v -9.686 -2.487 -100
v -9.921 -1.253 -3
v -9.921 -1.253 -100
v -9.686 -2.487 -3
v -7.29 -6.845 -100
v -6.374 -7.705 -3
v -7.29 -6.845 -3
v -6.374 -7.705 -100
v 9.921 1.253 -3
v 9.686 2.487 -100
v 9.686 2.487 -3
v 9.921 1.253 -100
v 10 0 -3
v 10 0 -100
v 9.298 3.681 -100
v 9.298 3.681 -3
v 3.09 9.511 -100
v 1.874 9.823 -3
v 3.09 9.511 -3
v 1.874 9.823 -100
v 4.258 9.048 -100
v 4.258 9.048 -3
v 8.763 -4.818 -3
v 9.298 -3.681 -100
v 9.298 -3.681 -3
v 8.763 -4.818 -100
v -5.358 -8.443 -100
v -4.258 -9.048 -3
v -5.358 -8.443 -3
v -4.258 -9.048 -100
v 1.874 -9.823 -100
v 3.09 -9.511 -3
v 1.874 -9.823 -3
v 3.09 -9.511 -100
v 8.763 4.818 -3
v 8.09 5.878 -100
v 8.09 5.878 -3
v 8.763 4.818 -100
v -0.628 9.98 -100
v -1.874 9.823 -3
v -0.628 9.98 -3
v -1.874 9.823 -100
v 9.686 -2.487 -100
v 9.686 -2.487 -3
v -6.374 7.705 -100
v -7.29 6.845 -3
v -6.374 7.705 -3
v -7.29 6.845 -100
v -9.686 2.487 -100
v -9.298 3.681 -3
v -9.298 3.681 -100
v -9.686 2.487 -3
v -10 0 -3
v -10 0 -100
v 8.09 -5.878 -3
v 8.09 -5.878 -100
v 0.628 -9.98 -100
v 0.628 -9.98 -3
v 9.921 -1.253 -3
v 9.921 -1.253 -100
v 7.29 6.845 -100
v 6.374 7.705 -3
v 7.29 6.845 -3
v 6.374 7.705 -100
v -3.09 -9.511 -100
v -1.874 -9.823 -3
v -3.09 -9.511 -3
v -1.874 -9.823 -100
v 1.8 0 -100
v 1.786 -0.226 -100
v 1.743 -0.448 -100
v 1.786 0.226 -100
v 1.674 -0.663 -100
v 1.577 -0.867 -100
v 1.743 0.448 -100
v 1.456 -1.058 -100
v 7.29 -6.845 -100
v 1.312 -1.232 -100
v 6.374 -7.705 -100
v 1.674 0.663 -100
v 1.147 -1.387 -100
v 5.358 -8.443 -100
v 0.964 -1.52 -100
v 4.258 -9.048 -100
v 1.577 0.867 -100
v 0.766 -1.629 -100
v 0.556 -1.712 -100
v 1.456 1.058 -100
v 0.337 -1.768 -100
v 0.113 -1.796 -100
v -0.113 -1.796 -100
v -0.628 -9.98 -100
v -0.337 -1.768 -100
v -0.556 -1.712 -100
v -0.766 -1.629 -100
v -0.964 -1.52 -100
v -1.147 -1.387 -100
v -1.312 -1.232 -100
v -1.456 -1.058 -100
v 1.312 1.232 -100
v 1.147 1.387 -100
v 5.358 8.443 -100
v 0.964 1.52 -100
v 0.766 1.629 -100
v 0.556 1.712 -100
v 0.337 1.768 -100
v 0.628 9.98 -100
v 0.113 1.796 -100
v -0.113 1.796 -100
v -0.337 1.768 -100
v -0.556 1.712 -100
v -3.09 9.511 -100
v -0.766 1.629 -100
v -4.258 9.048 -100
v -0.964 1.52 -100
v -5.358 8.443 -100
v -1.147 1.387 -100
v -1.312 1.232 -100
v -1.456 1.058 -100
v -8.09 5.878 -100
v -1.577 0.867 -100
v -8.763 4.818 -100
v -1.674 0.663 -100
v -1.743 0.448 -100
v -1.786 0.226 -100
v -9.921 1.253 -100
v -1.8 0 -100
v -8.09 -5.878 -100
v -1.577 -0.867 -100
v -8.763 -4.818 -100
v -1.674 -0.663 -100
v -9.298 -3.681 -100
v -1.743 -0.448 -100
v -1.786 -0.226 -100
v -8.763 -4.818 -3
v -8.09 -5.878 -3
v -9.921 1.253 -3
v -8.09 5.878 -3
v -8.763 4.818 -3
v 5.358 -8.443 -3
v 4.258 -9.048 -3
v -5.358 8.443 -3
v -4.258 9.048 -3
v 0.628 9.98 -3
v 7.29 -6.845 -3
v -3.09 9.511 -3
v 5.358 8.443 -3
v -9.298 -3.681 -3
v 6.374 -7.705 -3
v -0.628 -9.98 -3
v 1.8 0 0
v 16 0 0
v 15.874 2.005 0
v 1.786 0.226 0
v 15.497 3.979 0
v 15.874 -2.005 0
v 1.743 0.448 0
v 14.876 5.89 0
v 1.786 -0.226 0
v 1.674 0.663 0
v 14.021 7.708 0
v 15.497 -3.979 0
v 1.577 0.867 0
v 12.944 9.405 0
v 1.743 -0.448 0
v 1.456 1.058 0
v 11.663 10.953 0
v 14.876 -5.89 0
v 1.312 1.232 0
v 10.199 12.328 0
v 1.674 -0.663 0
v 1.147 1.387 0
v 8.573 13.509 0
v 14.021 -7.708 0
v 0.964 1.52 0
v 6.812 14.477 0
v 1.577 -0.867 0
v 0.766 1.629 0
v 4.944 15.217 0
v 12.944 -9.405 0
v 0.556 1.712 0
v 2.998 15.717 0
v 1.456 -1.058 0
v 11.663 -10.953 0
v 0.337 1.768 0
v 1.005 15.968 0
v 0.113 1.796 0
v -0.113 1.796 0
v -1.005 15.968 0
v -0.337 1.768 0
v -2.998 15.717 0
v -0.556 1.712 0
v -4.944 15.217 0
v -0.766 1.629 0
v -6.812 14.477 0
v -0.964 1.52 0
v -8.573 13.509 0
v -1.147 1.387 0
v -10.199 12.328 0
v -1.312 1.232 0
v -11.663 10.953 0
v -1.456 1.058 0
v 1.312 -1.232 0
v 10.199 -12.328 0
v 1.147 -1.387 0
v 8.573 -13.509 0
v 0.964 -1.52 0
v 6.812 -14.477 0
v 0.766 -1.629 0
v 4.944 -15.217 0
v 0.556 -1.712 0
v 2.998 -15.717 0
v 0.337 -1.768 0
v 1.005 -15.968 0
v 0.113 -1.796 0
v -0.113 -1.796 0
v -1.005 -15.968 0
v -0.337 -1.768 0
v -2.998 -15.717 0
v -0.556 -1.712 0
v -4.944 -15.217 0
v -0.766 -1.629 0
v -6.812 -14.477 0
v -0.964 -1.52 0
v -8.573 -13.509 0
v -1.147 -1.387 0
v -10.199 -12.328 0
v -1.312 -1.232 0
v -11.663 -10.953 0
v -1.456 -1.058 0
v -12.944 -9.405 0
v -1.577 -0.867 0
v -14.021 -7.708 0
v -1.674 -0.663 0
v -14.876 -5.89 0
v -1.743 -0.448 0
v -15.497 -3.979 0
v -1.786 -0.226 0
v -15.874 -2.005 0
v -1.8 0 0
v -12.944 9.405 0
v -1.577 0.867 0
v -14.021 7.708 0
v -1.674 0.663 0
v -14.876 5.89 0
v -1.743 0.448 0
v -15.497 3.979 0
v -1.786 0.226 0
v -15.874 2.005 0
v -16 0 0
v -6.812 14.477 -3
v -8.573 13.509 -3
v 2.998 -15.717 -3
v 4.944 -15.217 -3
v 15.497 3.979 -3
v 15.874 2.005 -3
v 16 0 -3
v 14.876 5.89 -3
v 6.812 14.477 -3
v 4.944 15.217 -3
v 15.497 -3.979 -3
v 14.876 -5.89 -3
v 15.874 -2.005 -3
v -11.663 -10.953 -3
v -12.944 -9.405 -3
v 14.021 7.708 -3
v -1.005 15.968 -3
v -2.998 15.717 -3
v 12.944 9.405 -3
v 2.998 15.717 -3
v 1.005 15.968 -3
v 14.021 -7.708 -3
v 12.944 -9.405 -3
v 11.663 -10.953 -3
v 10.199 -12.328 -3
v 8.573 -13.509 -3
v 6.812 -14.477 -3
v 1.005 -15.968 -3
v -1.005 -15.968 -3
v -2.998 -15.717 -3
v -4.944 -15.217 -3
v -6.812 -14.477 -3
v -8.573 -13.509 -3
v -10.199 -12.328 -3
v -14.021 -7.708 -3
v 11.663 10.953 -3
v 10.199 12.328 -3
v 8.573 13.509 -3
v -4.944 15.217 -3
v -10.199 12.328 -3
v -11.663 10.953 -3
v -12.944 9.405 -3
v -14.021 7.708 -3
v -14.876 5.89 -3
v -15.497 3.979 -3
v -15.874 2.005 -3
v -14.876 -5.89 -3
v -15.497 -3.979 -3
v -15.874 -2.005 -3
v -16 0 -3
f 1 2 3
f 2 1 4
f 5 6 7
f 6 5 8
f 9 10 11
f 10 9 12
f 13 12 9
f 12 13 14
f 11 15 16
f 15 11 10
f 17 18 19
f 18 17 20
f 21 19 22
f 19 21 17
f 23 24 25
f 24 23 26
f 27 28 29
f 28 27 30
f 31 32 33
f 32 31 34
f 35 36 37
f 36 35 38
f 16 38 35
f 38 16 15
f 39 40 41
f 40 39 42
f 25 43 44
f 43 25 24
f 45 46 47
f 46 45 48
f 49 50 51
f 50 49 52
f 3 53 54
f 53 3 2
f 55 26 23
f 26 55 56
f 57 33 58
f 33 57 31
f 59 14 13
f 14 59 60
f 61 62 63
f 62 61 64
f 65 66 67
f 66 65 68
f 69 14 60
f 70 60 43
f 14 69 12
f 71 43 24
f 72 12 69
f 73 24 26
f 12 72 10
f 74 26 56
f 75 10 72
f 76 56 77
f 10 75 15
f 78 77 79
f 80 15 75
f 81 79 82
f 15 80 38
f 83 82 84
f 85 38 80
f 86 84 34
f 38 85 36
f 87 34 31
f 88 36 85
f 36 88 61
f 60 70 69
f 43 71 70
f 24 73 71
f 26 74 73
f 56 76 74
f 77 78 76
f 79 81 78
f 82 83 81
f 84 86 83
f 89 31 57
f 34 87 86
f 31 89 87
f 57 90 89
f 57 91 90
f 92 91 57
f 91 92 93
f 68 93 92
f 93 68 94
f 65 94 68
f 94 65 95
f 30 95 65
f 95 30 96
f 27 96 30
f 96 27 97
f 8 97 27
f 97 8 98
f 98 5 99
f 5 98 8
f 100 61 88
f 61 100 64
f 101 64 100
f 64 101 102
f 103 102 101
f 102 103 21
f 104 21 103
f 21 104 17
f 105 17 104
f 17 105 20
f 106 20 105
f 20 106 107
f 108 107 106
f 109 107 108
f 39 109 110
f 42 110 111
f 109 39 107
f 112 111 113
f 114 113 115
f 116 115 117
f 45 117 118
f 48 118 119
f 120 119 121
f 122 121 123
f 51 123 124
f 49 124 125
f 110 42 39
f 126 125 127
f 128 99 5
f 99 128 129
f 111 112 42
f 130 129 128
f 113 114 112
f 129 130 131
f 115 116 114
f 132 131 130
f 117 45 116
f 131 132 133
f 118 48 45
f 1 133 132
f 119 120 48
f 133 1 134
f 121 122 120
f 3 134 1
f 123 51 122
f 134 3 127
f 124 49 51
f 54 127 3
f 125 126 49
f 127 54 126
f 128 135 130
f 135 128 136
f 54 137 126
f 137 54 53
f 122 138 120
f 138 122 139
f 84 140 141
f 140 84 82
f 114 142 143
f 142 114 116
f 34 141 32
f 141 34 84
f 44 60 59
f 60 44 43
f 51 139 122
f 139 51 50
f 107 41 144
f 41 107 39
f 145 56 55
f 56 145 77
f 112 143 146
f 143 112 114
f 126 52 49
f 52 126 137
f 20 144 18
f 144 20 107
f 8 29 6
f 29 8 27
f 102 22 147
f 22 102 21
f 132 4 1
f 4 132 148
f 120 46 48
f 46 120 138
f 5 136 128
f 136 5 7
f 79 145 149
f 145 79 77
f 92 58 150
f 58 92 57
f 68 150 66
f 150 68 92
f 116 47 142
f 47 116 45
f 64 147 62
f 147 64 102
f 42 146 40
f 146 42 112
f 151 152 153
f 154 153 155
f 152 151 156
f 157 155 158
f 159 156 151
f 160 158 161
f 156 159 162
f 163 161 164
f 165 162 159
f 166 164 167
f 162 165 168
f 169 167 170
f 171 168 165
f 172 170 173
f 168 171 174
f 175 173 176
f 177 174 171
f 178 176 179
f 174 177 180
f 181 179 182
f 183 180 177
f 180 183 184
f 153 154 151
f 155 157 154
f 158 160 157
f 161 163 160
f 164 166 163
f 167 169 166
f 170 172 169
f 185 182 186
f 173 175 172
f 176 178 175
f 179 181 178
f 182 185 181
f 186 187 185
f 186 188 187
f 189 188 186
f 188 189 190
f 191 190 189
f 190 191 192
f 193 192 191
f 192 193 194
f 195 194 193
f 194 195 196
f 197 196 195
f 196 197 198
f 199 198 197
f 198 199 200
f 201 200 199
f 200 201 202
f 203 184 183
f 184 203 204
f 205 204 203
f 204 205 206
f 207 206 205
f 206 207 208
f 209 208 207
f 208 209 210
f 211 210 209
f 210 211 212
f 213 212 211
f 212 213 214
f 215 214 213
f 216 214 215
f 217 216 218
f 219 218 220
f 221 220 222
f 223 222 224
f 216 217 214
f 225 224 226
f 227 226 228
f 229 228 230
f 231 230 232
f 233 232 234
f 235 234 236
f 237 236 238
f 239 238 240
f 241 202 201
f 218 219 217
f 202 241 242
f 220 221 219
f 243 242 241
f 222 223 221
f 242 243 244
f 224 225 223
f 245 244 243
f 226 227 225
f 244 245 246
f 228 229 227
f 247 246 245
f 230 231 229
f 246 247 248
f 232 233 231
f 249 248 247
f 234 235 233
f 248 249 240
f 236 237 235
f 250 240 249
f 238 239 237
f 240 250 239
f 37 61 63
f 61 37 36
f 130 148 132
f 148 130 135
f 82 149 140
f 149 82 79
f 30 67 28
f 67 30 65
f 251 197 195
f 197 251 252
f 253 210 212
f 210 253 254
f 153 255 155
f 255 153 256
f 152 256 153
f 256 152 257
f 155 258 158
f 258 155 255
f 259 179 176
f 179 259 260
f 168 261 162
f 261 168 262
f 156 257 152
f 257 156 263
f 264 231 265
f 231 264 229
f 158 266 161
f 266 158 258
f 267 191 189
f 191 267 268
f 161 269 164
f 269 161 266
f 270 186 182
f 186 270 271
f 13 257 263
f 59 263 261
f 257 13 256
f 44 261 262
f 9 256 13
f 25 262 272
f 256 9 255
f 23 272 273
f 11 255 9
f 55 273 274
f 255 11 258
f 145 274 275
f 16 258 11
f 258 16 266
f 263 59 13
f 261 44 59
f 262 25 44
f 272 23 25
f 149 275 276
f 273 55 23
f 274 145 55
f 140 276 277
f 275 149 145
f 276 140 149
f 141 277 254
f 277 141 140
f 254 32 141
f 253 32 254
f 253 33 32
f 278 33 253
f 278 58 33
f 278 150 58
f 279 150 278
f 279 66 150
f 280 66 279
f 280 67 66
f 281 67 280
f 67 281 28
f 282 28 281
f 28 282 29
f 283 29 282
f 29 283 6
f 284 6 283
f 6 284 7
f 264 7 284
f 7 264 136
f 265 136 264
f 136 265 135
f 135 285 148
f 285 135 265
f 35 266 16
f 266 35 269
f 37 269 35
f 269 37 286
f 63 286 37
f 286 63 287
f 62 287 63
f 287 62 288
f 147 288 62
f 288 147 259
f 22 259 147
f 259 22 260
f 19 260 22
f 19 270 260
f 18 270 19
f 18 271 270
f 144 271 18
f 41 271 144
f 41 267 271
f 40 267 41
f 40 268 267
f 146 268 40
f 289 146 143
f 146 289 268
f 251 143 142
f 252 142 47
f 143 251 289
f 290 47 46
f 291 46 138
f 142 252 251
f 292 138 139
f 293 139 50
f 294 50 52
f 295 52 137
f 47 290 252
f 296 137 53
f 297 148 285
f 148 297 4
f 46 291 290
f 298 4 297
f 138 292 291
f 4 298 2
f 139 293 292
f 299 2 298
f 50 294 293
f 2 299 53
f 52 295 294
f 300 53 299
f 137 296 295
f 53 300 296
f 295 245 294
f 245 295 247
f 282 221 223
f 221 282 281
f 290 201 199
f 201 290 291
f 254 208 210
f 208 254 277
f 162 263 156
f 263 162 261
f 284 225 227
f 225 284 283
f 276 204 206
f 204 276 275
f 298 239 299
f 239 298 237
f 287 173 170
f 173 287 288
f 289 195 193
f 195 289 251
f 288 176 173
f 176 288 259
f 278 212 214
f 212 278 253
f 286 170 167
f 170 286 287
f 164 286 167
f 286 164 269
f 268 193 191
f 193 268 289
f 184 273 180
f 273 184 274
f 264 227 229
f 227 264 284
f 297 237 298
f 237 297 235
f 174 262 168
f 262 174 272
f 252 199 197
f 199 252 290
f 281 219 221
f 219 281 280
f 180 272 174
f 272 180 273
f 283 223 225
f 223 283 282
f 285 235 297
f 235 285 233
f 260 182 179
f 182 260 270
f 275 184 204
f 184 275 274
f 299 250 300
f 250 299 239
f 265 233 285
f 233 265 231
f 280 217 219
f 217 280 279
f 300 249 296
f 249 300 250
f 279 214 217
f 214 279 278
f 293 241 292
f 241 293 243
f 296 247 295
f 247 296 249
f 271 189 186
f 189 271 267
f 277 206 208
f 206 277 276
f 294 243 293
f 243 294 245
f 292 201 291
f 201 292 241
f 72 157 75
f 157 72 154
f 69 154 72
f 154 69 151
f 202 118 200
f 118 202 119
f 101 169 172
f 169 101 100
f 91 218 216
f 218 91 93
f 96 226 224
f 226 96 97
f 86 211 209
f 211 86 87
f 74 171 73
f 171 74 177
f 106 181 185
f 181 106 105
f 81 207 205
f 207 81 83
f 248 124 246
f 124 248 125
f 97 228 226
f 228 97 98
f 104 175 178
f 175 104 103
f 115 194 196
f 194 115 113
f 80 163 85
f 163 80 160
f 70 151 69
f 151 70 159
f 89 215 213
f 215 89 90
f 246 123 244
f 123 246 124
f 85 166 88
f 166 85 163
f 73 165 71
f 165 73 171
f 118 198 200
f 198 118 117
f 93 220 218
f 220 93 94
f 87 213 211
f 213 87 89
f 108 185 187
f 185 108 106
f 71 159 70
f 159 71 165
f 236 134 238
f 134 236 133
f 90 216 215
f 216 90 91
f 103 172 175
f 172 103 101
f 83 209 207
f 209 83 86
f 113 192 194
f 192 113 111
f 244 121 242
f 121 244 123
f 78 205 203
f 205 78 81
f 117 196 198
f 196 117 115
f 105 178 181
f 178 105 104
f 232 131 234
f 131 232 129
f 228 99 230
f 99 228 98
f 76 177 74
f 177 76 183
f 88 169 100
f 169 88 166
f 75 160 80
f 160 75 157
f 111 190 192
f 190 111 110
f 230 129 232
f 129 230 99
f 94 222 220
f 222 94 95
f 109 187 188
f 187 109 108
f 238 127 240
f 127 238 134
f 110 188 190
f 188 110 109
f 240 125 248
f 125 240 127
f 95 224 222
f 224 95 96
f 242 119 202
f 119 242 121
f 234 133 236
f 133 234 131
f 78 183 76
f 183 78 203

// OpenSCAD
$fn = 50;


difference() {
	union() {
		translate(v = [0, 0, -100.0000000000]) {
			cylinder(h = 100, r = 10.0000000000);
		}
		translate(v = [0, 0, -3.0000000000]) {
			cylinder(h = 3, r = 16.0000000000);
		}
	}
	union() {
		#translate(v = [0, 0, -100]) {
			cylinder(h = 100, r = 1.8000000000);
		}
	}
}
